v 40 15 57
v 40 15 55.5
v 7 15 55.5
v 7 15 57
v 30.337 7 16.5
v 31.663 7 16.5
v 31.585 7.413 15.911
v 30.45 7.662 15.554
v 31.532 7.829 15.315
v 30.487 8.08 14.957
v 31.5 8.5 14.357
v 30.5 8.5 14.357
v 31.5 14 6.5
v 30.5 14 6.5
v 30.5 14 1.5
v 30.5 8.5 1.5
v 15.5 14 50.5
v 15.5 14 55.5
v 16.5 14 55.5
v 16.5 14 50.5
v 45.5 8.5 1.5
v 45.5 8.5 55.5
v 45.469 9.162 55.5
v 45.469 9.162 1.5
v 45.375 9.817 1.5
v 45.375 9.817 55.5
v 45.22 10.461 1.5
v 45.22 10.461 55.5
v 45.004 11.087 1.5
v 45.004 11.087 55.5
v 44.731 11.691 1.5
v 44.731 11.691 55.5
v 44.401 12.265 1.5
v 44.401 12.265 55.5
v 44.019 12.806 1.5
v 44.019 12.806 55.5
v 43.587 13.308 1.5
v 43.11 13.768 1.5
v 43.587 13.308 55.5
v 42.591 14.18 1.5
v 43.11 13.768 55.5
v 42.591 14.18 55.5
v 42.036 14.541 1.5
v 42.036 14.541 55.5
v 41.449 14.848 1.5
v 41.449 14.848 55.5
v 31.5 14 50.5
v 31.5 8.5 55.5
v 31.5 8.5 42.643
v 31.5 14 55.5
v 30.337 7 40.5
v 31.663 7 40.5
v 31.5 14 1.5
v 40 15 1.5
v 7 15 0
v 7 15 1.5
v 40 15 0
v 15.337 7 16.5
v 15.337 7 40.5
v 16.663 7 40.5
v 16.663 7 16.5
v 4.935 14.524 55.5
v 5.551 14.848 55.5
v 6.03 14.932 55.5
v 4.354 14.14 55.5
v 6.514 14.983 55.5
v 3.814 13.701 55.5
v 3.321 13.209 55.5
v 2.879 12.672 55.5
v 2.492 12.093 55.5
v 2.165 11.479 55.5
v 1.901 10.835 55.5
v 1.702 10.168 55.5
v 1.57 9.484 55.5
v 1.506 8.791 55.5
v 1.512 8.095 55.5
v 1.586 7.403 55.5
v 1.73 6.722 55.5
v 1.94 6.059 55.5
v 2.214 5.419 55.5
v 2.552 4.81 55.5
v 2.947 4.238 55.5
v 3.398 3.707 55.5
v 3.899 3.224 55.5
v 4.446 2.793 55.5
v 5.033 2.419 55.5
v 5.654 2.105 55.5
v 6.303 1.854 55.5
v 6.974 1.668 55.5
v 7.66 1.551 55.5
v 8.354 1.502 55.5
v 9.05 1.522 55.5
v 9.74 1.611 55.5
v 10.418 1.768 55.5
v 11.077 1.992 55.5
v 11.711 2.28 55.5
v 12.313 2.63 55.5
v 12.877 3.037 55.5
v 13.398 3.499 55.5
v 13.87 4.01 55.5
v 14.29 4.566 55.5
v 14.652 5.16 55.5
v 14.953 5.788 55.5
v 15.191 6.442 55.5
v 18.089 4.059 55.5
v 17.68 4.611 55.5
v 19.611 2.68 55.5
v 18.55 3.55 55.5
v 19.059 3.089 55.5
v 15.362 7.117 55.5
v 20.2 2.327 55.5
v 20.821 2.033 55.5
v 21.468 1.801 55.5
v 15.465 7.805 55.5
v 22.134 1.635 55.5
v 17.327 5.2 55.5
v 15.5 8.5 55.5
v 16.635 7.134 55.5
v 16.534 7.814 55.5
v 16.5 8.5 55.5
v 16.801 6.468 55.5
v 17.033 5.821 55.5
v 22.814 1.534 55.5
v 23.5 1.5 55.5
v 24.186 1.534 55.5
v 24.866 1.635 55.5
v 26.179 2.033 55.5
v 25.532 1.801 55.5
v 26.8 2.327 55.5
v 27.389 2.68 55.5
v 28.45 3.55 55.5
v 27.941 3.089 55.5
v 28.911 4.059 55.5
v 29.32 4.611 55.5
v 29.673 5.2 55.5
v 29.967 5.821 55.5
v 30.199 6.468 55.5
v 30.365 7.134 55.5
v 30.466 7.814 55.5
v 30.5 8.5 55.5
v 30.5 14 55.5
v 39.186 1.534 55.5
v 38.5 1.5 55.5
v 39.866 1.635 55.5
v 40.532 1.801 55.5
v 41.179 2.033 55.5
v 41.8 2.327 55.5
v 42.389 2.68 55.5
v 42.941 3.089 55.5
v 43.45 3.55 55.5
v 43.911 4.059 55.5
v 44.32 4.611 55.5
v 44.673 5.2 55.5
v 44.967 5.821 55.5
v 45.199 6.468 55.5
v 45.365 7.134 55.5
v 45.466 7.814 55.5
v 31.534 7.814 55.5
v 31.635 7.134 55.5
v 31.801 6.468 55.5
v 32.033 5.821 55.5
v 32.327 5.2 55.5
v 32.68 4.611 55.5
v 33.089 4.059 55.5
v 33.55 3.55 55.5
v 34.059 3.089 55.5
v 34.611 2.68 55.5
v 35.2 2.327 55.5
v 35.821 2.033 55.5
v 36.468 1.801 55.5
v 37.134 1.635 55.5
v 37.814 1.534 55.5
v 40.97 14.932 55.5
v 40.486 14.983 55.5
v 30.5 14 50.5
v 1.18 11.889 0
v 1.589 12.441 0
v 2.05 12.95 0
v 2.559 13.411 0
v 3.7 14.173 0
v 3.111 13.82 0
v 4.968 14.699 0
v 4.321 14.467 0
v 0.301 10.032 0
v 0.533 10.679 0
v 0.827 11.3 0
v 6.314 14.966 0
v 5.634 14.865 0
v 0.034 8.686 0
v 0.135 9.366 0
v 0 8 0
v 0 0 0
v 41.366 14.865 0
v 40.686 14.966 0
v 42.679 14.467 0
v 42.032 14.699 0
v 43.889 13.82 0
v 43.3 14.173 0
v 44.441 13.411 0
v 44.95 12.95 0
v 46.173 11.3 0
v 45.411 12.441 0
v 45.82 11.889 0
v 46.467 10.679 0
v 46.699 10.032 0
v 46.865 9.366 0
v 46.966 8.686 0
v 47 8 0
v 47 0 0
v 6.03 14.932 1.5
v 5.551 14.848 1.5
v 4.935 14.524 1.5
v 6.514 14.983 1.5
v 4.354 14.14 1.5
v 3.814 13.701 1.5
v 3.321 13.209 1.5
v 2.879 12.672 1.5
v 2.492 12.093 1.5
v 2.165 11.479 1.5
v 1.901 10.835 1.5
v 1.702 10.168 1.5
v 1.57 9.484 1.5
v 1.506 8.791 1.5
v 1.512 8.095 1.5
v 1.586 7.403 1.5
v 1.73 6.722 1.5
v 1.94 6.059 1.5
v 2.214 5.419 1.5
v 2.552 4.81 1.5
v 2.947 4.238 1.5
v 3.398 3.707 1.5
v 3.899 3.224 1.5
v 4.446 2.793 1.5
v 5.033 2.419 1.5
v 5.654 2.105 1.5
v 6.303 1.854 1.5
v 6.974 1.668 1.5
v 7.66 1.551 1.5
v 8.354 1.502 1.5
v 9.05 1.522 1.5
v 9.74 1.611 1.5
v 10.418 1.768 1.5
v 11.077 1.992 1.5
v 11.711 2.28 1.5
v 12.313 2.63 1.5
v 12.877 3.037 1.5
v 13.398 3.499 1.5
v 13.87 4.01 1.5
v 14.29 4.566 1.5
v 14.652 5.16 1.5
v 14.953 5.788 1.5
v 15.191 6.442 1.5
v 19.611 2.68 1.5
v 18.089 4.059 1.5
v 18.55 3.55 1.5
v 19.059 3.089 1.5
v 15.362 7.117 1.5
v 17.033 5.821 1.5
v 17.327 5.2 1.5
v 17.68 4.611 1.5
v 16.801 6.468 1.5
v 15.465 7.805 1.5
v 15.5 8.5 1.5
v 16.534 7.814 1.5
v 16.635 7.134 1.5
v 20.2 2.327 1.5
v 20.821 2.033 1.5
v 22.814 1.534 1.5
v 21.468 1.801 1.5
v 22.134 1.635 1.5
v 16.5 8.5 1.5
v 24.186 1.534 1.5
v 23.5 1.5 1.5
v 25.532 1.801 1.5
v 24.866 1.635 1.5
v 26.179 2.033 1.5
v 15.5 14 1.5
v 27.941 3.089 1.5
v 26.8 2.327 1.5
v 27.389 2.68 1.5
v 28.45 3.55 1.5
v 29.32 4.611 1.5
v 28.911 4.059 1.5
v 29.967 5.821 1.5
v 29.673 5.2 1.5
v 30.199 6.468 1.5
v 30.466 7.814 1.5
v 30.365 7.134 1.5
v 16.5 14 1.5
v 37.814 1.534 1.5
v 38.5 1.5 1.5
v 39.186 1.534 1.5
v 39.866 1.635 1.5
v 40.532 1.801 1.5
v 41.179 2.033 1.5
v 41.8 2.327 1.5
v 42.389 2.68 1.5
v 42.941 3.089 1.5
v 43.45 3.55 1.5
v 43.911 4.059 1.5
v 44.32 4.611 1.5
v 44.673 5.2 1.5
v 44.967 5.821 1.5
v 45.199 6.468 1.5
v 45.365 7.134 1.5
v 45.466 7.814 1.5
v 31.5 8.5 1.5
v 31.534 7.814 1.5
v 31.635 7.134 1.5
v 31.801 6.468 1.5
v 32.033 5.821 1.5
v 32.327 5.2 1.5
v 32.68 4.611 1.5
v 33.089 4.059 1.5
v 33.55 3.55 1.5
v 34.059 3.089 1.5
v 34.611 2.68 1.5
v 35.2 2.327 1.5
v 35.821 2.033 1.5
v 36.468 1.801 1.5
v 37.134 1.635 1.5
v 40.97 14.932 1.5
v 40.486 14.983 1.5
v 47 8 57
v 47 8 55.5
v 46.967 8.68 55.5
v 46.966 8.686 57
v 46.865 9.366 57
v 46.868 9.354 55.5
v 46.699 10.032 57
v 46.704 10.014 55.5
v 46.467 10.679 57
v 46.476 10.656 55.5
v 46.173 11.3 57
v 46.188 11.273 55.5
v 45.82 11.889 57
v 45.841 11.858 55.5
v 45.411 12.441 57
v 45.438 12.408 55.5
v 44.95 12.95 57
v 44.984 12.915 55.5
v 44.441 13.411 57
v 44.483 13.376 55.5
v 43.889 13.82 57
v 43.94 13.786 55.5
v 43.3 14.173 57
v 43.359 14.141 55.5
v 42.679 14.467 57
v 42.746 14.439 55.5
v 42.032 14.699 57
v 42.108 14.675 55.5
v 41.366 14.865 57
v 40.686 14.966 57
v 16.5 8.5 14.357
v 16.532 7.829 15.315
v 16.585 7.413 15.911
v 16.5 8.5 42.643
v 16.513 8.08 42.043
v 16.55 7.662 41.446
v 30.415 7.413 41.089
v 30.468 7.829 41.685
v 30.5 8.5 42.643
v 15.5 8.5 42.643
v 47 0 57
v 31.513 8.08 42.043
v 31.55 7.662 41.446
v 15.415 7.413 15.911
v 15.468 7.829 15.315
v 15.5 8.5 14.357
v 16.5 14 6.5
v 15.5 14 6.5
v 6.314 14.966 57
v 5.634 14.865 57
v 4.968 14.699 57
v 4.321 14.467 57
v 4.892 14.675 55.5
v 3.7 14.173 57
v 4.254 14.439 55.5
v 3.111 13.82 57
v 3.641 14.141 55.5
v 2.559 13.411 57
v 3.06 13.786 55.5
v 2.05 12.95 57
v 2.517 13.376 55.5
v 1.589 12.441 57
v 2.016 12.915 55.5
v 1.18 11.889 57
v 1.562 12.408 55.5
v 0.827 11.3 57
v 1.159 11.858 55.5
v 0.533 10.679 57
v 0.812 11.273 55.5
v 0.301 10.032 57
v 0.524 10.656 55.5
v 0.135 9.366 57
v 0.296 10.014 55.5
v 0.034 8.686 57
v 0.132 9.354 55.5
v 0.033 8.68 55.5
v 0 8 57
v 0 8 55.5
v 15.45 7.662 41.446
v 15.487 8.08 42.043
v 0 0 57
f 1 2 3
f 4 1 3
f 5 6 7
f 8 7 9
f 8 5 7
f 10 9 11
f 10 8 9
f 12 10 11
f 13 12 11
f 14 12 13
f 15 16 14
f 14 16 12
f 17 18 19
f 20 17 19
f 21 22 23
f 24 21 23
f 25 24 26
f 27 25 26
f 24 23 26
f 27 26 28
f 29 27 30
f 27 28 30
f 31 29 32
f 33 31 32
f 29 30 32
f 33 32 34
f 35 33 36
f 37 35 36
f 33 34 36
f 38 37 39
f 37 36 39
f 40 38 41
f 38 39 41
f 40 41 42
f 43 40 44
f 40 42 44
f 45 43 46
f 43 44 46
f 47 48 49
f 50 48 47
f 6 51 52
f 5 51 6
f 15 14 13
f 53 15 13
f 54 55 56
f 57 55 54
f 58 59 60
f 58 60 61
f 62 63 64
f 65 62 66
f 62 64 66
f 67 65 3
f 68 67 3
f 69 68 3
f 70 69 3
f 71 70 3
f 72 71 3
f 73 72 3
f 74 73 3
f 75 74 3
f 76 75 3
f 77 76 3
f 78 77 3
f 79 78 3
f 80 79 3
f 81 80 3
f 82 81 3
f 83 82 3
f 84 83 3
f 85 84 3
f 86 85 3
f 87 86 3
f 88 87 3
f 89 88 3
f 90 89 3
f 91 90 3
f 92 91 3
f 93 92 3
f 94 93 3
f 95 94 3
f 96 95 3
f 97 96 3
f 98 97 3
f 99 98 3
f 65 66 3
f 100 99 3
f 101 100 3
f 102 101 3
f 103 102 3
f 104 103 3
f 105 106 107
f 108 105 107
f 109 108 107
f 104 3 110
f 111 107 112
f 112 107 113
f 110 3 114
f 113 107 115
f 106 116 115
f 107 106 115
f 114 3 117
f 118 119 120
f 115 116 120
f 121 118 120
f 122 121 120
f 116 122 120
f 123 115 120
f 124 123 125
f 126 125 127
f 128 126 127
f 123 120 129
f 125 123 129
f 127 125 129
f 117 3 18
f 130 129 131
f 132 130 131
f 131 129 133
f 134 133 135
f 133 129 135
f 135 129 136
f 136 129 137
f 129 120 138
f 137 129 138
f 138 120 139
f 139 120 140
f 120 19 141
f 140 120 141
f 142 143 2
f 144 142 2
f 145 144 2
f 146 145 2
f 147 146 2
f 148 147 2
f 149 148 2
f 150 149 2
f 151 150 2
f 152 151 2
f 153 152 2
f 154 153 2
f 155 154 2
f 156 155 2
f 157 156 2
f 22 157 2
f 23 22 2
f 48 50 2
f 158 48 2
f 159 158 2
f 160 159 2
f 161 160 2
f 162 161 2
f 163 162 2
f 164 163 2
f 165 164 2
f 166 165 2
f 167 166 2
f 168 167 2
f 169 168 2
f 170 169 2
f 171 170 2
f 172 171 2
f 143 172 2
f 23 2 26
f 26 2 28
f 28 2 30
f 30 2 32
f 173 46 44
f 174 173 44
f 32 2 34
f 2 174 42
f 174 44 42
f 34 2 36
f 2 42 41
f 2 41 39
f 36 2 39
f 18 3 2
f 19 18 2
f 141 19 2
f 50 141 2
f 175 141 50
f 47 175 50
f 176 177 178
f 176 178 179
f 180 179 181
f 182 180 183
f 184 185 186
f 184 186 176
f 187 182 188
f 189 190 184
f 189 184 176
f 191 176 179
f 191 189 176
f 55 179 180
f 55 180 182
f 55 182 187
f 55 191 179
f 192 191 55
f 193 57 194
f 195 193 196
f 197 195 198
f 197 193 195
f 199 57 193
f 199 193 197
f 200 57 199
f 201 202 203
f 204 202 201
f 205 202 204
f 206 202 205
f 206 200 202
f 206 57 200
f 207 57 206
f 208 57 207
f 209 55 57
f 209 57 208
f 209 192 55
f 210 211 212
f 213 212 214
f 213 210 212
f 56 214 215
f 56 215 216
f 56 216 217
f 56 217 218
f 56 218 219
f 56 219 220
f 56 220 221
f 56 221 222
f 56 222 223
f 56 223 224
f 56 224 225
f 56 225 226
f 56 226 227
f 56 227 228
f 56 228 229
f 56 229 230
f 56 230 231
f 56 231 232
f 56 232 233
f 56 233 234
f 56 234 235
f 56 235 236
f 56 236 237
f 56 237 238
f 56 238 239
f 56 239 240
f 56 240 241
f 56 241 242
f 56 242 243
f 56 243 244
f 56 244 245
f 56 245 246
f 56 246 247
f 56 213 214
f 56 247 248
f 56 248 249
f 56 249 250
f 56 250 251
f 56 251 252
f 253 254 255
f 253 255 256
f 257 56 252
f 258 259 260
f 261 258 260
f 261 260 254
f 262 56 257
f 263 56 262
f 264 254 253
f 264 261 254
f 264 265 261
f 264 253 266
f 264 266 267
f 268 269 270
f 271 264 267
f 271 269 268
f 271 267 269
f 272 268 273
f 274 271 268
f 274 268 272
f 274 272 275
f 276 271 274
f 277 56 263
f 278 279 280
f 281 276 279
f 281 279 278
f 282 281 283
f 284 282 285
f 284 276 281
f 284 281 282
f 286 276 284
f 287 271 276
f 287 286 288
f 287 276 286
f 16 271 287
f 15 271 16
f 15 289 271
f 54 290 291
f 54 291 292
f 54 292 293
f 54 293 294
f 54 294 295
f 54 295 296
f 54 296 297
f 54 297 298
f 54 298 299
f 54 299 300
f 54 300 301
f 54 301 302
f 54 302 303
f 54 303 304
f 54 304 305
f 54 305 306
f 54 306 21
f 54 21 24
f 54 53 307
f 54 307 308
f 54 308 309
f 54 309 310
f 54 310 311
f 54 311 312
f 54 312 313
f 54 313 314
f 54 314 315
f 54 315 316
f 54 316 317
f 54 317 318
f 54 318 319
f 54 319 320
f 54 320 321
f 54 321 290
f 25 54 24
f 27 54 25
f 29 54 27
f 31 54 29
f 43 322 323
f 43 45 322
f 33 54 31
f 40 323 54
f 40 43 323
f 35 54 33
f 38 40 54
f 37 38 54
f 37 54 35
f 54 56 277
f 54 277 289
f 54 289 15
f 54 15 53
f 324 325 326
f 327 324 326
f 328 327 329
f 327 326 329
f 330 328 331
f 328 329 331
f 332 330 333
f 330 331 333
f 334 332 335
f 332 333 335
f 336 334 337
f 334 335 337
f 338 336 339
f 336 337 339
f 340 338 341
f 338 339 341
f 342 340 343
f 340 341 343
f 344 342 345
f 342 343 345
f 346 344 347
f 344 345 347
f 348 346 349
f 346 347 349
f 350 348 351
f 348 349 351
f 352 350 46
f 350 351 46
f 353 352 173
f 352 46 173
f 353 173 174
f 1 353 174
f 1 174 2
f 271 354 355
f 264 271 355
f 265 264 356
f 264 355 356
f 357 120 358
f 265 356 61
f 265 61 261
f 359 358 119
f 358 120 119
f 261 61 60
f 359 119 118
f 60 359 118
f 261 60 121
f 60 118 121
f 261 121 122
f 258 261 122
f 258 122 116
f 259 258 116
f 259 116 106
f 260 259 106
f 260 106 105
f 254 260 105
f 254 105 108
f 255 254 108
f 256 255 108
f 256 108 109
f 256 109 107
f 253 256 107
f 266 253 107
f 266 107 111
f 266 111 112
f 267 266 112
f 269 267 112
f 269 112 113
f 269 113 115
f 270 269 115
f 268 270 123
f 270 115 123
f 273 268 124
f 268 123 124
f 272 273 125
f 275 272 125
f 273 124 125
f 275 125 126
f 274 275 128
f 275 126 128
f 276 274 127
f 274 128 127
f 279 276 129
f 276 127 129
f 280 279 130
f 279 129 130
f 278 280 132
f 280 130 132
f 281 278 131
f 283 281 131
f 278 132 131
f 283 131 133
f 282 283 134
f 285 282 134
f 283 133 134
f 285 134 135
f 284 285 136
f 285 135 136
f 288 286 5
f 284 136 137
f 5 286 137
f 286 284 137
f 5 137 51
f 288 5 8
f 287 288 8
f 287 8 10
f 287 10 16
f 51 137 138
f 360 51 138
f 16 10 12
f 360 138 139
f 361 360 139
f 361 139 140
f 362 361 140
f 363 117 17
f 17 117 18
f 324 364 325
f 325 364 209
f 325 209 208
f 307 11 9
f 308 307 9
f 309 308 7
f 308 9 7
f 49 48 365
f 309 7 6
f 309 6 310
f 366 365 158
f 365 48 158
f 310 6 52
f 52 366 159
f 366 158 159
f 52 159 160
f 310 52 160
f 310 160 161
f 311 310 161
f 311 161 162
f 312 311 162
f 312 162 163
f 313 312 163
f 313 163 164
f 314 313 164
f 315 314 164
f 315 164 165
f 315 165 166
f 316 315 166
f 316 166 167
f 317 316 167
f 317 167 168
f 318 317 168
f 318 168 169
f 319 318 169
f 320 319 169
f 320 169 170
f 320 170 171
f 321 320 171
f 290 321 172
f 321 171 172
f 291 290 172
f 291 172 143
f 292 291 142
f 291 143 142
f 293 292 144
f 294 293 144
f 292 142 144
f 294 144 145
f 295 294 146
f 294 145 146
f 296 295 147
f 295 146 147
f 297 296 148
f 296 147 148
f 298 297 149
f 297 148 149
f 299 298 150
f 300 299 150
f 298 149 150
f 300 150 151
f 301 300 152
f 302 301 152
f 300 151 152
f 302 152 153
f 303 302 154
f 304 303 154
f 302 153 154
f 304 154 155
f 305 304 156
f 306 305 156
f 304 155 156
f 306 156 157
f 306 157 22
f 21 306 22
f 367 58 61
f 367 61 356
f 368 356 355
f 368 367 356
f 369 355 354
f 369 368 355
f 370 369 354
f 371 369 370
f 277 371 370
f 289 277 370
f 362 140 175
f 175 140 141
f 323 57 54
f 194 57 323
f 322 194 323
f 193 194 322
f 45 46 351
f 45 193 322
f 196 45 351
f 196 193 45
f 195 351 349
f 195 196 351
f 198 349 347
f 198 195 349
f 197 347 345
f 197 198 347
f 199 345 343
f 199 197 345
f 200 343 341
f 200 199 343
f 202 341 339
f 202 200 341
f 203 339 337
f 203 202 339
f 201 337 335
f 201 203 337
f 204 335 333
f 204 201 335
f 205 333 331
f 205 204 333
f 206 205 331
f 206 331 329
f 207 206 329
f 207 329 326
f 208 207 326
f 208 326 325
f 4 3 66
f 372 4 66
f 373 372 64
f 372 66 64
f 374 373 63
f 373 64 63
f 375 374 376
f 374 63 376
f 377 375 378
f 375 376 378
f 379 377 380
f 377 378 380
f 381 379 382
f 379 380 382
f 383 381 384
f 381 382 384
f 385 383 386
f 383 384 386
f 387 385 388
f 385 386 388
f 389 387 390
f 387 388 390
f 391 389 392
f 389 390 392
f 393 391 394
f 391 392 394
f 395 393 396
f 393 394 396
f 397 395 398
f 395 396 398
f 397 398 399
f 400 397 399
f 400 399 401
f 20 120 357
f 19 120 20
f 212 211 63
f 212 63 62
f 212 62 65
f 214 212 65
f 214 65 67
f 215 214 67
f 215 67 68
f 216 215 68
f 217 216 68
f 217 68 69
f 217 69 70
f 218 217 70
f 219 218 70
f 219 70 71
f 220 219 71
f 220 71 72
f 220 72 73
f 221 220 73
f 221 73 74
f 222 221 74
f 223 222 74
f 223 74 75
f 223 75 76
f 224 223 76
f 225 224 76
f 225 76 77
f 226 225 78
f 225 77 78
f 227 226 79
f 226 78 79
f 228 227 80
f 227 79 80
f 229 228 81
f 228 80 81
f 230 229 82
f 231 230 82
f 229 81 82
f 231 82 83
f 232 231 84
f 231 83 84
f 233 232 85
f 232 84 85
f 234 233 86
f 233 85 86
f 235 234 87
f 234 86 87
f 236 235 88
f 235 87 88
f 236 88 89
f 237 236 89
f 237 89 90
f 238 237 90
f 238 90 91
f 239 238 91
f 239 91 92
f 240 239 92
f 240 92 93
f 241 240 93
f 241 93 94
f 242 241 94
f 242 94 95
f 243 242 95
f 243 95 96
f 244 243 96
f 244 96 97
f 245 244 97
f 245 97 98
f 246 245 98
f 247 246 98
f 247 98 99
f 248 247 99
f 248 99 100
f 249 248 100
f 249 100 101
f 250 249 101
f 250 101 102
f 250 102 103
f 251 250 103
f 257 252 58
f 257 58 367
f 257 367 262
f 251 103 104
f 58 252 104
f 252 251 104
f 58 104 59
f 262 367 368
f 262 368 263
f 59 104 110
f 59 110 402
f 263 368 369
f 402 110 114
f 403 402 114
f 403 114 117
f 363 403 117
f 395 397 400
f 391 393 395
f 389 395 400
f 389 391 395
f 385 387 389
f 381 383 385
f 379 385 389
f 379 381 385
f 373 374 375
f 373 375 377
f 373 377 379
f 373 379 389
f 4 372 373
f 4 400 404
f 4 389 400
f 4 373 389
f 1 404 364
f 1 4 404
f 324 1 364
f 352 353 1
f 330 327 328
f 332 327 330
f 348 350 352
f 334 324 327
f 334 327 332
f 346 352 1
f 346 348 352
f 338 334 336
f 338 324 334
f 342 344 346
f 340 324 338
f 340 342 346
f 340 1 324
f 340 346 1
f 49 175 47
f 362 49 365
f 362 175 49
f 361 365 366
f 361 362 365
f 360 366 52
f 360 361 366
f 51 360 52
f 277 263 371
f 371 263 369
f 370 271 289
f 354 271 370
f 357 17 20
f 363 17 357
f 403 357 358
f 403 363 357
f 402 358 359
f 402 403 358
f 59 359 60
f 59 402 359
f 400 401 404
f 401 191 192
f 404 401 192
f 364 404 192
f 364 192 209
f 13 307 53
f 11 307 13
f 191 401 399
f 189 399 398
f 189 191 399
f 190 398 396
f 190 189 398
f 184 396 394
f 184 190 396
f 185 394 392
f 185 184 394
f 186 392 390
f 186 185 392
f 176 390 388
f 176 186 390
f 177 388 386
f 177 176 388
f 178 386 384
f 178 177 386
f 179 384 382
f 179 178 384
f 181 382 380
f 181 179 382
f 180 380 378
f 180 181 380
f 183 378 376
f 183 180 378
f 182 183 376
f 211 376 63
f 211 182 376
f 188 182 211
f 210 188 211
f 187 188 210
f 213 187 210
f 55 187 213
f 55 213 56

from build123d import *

# Parameters (mm, degrees)
SKETCH1_W           = 47
SKETCH1_H           = 55.5
BOSS_EXTRUDE1_DEPTH = 15
CUT_EXTRUDE4_DEPTH  = 54
FILLET1_R           = 7
FILLET2_R           = 7
SKETCH3_W           = 4.401923789
SKETCH3_H           = 6.5
CUT_EXTRUDE5_DEPTH  = 54
SKETCH4_W           = 1
SKETCH4_H           = 1
CUT_EXTRUDE6_DEPTH  = 54
CUT_EXTRUDE7_DEPTH  = 20
CUT_EXTRUDE8_DEPTH  = 5
BOSS_EXTRUDE3_DEPTH = 1.5


with BuildPart() as part:
    # Sketch1 → Boss-Extrude1 (new body)
    with BuildSketch(Plane(origin=(0, 0, 0), x_dir=(1, 0, 0), z_dir=(0, 1, 0))):
        with Locations((23.5, -27.75)):
            Rectangle(SKETCH1_W, SKETCH1_H)
    extrude(amount=BOSS_EXTRUDE1_DEPTH)

    # Sketch2 → Cut-Extrude4 (cut)
    with BuildSketch(Plane.XY.offset(55.5)):
        with BuildLine():
            Line((11.098076211, 15), (5.901923789, 15))
            ThreePointArc((5.901923789, 15), (8.5, 1.5), (11.098076211, 15))
        make_face()
        with BuildLine():
            Line((26.098076211, 15), (20.901923789, 15))
            ThreePointArc((20.901923789, 15), (23.5, 1.5), (26.098076211, 15))
        make_face()
        with BuildLine():
            ThreePointArc((35.901923789, 15), (38.5, 1.5), (41.098076211, 15))
            Line((41.098076211, 15), (35.901923789, 15))
        make_face()
    extrude(amount=-CUT_EXTRUDE4_DEPTH, mode=Mode.SUBTRACT)

    # Fillet1
    fillet1_edges = [part.edges().sort_by_distance(p)[0] for p in [
        (47, 15, 27.75),
    ]]
    fillet(fillet1_edges, radius=FILLET1_R)

    # Fillet2
    fillet2_edges = [part.edges().sort_by_distance(p)[0] for p in [
        (0, 15, 27.75),
    ]]
    fillet(fillet2_edges, radius=FILLET2_R)

    # Sketch3 → Cut-Extrude5 (cut)
    with BuildSketch(Plane.XY.offset(55.5)):
        with Locations((28.299038106, 11.75)):
            Rectangle(SKETCH3_W, SKETCH3_H)
        with Locations((33.700961895, 11.75)):
            Rectangle(SKETCH3_W, SKETCH3_H)
        with Locations((13.299038106, 11.75)):
            Rectangle(SKETCH3_W, SKETCH3_H)
        with Locations((18.700961895, 11.75)):
            Rectangle(SKETCH3_W, SKETCH3_H)
    extrude(amount=-CUT_EXTRUDE5_DEPTH, mode=Mode.SUBTRACT)

    # Sketch4 → Cut-Extrude6 (cut)
    with BuildSketch(Plane.XY.offset(55.5)):
        with Locations((16, 14.5)):
            Rectangle(SKETCH4_W, SKETCH4_H)
        with Locations((31, 14.5)):
            Rectangle(SKETCH4_W, SKETCH4_H)
    extrude(amount=-CUT_EXTRUDE6_DEPTH, mode=Mode.SUBTRACT)

    # Sketch5 → Cut-Extrude7 (cut)
    with BuildSketch(Plane.ZY.offset(-15.5)):
        Polygon((6.5, 14), (50.5, 14), (40.5, 7), (16.5, 7), align=None)
    extrude(amount=-CUT_EXTRUDE7_DEPTH, mode=Mode.SUBTRACT)

    # Sketch5<2> → Cut-Extrude8 (cut)
    with BuildSketch(Plane.ZY.offset(-15.5)):
        Polygon((6.5, 14), (50.5, 14), (40.5, 7), (16.5, 7), align=None)
    extrude(amount=CUT_EXTRUDE8_DEPTH, mode=Mode.SUBTRACT)

    # Sketch6 → Boss-Extrude3 (add)
    with BuildSketch(Plane.XY.offset(55.5)):
        with BuildLine():
            Line((0, 0), (47, 0))
            Line((47, 0), (47, 8))
            ThreePointArc((47, 8), (44.949747468, 12.949747468), (40, 15))
            Line((40, 15), (7, 15))
            ThreePointArc((7, 15), (2.050252532, 12.949747468), (0, 8))
            Line((0, 8), (0, 0))
        make_face()
    extrude(amount=BOSS_EXTRUDE3_DEPTH)


solid = part.part
